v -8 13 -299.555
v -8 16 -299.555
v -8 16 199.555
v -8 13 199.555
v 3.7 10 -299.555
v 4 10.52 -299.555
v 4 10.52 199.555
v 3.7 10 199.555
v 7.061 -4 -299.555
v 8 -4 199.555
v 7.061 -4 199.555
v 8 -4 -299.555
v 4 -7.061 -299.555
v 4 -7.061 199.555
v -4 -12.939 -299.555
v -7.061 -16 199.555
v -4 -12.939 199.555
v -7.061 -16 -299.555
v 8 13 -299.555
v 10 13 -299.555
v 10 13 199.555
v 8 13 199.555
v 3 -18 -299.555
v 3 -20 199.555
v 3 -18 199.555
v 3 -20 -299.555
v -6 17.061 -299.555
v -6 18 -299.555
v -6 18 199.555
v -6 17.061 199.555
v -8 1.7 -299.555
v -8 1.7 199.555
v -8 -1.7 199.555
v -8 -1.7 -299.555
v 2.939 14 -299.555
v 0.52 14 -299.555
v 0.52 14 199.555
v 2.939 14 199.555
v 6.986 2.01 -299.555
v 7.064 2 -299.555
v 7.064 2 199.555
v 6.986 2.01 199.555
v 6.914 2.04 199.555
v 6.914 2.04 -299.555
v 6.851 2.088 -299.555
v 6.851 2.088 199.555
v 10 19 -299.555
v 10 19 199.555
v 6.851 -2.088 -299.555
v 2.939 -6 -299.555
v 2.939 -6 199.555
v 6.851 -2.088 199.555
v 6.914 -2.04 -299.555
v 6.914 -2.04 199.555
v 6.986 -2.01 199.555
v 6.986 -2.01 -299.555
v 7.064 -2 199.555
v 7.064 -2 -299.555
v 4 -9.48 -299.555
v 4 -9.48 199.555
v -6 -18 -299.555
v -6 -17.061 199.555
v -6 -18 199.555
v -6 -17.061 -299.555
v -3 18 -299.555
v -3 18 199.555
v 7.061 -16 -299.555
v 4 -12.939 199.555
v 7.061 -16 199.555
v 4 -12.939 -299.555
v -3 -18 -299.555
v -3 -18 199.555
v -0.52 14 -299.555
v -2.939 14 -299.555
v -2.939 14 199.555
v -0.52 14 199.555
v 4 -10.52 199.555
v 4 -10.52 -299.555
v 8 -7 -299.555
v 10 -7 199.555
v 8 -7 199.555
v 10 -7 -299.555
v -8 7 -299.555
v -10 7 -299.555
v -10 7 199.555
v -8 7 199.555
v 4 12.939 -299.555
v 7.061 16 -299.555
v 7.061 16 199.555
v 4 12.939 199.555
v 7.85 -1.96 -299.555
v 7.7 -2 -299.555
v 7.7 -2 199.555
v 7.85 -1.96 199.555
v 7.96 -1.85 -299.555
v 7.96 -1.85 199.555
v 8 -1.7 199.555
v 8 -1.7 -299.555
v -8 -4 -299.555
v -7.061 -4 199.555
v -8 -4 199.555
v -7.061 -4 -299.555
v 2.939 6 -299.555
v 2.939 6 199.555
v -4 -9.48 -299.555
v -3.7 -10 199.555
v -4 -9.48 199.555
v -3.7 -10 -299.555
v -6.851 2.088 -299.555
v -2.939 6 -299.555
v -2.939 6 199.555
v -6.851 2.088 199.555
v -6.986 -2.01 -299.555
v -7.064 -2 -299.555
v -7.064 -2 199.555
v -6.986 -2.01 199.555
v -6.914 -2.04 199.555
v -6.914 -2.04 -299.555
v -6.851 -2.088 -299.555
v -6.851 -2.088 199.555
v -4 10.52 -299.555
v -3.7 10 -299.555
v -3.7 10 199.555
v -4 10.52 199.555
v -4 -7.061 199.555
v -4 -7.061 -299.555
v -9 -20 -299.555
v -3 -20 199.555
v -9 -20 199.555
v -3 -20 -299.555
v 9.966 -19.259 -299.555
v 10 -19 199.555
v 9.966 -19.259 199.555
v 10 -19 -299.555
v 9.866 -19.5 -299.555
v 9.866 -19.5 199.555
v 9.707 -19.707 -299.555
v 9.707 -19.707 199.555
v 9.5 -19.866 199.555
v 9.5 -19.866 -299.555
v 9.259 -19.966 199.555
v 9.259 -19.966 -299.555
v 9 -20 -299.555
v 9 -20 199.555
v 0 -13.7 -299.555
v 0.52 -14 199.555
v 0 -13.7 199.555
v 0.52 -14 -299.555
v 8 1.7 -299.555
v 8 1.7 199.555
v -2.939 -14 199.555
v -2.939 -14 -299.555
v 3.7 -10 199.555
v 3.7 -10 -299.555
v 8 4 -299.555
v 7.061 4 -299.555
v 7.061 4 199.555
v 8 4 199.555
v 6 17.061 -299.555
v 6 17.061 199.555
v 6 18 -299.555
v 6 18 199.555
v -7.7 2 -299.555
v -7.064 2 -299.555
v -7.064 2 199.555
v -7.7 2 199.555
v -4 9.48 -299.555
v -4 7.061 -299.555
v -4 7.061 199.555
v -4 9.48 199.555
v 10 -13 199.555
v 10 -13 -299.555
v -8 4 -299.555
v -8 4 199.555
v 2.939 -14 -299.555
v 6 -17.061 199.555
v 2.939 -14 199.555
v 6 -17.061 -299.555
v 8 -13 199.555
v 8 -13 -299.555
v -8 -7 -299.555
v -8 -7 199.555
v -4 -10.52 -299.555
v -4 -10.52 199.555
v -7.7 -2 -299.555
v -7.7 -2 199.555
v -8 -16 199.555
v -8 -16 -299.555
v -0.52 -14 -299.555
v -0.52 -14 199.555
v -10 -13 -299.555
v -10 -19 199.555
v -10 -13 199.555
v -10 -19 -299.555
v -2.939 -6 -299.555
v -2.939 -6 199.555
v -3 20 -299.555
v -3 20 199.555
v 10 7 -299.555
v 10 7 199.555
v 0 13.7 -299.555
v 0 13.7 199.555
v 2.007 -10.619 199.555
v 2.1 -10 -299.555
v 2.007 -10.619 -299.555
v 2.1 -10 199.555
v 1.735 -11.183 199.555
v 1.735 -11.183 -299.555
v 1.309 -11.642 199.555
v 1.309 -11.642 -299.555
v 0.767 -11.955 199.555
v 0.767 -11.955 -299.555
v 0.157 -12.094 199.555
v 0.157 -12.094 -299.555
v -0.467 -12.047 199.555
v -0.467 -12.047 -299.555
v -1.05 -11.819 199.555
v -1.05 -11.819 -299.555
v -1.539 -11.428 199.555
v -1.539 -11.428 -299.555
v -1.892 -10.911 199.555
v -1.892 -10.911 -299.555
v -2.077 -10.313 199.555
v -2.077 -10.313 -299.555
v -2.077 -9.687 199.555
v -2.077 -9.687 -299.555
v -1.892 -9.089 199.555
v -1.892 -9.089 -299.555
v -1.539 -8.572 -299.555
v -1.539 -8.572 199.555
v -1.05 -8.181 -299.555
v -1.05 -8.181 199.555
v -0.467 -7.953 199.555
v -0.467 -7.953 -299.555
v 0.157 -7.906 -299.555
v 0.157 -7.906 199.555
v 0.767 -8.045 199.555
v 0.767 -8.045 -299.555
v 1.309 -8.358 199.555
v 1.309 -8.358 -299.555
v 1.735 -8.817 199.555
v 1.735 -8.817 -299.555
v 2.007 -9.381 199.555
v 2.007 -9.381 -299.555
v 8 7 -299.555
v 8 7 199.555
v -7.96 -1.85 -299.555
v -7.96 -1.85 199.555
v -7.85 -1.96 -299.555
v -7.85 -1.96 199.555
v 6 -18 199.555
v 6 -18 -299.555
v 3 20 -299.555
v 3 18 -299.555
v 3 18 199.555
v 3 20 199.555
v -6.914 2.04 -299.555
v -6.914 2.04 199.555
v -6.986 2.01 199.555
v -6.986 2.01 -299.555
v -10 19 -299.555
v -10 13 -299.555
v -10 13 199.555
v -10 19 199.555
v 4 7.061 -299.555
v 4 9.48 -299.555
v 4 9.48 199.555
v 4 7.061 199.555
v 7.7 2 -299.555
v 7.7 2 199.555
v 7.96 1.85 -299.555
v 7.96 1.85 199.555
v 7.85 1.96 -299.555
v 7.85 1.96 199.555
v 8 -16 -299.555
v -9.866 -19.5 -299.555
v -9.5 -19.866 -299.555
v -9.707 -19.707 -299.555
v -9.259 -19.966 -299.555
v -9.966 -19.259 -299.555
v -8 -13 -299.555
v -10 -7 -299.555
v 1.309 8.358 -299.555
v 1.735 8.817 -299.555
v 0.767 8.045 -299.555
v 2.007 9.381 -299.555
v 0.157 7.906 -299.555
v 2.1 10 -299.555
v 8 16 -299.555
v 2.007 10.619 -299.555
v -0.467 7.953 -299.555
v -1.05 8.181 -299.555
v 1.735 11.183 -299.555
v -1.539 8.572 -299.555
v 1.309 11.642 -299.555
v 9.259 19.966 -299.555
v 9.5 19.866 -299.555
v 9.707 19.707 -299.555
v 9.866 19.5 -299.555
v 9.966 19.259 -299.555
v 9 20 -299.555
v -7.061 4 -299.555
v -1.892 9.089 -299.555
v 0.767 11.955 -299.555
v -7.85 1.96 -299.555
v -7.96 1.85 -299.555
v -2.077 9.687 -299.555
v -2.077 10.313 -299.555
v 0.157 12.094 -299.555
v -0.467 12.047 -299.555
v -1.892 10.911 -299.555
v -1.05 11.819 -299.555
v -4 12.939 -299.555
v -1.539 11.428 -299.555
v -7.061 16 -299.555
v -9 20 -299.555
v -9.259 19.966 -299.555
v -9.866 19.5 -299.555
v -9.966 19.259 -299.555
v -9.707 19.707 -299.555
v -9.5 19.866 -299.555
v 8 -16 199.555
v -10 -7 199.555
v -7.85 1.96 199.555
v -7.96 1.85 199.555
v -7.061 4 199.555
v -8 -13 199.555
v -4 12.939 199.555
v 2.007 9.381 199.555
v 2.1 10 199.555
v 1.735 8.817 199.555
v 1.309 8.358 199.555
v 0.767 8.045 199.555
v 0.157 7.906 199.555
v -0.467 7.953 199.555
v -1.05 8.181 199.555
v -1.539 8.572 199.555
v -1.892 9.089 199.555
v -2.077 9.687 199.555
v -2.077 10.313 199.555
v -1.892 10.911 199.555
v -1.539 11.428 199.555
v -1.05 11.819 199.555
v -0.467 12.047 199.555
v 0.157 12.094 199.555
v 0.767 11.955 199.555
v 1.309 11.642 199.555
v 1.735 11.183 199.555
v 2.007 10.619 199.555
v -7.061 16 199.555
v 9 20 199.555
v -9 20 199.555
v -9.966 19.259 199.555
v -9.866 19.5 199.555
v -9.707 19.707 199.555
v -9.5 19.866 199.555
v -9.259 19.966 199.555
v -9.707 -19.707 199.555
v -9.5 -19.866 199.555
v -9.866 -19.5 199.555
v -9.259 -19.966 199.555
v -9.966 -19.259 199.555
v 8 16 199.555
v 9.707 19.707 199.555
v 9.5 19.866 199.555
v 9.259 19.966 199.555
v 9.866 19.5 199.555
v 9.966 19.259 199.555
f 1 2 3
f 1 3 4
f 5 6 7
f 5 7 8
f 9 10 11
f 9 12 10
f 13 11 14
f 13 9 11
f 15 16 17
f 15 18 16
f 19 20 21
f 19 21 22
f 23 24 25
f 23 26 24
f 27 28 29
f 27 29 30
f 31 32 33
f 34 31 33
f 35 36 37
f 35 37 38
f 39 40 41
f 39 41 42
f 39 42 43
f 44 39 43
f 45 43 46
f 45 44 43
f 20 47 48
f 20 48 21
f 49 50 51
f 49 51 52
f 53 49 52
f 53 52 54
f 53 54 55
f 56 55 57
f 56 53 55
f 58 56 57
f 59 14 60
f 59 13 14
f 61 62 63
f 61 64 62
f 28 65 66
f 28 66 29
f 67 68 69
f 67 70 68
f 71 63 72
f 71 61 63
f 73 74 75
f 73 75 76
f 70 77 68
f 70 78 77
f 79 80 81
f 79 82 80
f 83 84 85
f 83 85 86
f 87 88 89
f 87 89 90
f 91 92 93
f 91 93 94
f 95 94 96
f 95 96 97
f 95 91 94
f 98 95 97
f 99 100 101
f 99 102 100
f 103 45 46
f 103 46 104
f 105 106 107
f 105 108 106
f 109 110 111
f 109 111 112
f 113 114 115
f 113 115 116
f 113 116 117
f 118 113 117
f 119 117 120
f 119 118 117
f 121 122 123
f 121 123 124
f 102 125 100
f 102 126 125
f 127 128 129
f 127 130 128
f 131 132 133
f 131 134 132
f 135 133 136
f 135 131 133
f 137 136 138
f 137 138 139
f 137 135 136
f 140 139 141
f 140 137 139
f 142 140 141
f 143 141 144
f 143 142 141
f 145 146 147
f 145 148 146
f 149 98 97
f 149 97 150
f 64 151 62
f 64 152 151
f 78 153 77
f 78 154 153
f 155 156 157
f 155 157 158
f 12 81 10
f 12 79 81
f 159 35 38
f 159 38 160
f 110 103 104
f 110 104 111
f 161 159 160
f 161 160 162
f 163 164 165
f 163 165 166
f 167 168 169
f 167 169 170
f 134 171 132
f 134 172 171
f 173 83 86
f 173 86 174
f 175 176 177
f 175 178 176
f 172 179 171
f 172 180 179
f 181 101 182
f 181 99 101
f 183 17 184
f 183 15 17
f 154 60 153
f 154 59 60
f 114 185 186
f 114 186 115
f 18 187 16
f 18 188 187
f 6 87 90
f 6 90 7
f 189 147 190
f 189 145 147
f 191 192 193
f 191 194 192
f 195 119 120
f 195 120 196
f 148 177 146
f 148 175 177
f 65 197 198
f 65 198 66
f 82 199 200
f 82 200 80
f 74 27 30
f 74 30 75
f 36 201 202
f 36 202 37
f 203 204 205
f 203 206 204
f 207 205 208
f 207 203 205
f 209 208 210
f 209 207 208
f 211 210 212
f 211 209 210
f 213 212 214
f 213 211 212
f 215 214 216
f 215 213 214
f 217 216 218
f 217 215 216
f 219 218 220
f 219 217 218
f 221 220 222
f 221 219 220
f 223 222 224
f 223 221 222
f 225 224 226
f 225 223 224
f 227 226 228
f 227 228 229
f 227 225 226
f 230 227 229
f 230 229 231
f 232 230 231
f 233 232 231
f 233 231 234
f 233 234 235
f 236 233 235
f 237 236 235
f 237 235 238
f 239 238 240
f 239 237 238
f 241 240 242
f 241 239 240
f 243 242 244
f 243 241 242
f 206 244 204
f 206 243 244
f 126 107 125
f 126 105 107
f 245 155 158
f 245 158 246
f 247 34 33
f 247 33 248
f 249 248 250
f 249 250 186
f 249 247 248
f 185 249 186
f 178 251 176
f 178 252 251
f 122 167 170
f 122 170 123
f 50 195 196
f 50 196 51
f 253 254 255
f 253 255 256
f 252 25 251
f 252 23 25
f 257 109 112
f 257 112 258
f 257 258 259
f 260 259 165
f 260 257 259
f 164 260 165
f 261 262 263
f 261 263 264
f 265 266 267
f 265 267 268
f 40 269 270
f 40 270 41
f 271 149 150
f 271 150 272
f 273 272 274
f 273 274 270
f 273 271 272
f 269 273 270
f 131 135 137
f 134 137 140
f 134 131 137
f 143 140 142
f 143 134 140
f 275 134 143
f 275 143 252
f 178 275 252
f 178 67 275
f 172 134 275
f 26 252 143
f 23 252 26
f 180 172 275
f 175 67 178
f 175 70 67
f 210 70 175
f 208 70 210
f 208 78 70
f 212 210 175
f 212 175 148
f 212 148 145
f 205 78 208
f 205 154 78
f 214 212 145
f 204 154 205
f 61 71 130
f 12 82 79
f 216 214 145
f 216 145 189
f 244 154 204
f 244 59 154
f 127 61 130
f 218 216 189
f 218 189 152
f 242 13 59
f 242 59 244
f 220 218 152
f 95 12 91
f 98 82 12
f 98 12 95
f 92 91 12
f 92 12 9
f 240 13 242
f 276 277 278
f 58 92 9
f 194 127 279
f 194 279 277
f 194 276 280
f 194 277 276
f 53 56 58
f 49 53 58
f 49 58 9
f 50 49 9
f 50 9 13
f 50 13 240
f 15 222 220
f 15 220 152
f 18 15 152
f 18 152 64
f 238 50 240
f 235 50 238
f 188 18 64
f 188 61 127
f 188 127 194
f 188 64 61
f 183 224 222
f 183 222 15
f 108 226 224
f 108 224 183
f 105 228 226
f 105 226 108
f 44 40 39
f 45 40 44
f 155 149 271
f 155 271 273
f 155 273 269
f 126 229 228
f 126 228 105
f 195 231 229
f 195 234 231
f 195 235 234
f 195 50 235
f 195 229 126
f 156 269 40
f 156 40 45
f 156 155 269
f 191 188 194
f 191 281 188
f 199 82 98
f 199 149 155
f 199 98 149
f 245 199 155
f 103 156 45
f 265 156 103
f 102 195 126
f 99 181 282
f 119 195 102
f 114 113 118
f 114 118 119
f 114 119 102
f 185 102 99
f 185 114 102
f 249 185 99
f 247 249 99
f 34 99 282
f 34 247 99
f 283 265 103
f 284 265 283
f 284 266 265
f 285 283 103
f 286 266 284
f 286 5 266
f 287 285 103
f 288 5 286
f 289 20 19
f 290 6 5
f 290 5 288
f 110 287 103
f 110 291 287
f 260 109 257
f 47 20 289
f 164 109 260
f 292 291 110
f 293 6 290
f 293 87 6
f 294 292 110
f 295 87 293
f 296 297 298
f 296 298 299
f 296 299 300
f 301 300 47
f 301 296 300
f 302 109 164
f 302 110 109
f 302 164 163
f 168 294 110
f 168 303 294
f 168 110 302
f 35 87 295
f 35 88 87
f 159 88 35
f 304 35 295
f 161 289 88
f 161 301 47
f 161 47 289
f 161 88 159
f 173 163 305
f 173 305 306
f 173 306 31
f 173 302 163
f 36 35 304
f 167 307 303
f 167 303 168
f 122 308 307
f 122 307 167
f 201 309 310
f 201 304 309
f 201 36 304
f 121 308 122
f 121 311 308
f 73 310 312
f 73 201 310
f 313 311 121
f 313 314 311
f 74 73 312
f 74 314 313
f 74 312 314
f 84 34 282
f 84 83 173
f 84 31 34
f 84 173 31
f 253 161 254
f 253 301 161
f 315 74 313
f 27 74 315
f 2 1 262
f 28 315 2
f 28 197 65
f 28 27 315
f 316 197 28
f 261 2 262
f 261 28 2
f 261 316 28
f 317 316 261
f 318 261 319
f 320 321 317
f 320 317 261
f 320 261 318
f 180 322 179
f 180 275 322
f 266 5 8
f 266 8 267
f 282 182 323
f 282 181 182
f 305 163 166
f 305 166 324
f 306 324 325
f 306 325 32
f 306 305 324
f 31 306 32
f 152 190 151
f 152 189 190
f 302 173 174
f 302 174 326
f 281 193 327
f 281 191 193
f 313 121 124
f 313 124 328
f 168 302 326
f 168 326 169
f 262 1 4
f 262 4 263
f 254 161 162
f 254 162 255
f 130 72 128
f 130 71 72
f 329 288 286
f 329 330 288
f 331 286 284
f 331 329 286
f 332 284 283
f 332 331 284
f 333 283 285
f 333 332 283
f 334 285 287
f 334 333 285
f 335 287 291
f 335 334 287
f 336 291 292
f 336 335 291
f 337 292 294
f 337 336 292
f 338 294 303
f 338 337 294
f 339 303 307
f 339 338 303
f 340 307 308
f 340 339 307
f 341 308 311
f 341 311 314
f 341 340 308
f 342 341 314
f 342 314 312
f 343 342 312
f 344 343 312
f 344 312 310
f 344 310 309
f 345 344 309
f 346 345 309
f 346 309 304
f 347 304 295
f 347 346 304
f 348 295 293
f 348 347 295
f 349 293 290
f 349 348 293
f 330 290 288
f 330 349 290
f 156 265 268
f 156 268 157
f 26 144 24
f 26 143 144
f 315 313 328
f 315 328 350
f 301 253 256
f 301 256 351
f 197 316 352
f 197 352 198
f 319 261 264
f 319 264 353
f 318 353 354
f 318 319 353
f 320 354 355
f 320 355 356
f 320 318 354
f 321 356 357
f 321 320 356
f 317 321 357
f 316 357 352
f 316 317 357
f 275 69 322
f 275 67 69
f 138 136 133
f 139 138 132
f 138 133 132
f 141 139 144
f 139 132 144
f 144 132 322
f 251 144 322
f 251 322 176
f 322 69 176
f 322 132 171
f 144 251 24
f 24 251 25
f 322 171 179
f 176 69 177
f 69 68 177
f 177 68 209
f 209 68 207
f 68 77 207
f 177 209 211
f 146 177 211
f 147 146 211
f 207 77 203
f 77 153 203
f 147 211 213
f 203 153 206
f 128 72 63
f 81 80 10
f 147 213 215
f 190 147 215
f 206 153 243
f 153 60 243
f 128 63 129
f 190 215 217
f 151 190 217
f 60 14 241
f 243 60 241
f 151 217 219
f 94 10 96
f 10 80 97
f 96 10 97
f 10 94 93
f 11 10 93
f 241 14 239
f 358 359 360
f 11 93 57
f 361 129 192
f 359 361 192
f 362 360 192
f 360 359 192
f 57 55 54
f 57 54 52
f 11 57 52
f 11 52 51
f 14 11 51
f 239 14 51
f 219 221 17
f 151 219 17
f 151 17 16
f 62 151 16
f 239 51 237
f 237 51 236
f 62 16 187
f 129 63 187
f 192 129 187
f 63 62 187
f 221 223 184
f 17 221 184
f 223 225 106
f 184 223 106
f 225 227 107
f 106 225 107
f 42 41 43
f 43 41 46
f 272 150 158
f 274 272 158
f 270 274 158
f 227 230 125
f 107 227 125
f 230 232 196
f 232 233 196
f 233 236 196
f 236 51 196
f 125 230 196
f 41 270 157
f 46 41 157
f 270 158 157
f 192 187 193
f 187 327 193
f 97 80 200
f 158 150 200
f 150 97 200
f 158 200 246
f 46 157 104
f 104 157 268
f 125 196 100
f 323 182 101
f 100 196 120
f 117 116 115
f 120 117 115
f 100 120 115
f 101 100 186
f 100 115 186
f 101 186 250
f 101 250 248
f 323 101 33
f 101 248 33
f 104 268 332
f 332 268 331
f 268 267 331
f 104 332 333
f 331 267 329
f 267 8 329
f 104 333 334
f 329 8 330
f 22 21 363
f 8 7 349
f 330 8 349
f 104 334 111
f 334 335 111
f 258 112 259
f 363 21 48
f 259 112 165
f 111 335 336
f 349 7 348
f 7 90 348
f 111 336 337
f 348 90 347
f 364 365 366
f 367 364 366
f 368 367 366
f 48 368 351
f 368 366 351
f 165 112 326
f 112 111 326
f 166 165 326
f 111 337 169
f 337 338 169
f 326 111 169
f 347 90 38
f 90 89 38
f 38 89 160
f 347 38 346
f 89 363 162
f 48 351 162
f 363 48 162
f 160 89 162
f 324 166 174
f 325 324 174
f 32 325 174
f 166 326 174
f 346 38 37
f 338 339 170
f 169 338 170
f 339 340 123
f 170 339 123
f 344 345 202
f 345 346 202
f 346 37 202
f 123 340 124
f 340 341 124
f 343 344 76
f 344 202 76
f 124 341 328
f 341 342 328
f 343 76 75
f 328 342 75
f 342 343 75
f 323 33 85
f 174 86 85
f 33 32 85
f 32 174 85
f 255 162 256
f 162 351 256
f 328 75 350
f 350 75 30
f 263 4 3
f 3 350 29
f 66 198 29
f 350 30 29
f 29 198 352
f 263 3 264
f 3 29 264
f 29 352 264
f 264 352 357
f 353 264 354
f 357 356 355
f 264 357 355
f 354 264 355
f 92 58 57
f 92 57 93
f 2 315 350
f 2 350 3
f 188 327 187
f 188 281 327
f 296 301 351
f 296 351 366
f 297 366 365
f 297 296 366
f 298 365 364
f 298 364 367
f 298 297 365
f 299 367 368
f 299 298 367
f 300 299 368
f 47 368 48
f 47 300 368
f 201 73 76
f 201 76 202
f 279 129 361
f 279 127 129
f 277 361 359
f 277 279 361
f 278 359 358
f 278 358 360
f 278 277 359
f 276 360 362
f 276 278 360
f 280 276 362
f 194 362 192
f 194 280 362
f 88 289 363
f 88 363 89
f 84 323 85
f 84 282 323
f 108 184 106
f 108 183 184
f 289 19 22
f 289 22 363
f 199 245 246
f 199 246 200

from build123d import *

# Parameters (mm, degrees)
SKETCH1_R           = 2.1
BOSS_EXTRUDE1_DEPTH = 249.555


with BuildPart() as part:
    # Sketch1 → Boss-Extrude1 (new, symmetric)
    with BuildSketch(Plane(origin=(0, 0, -50), x_dir=(-1, 0, 0), z_dir=(0, 0, -1))):
        with BuildLine():
            Line((10, -7), (10, 7))
            Line((10, 7), (8, 7))
            Line((8, 7), (8, 4))
            Line((8, 4), (7.060660172, 4))
            Line((7.060660172, 4), (4, 7.060660172))
            Line((4, 7.060660172), (4, 9.480384758))
            Line((4, 9.480384758), (3.7, 10))
            Line((3.7, 10), (4, 10.519615242))
            Line((4, 10.519615242), (4, 12.939339828))
            Line((4, 12.939339828), (7.060660172, 16))
            Line((7.060660172, 16), (8, 16))
            Line((8, 16), (8, 13))
            Line((8, 13), (10, 13))
            Line((10, 13), (10, 19))
            ThreePointArc((10, 19), (9.707106781, 19.707106781), (9, 20))
            Line((9, 20), (3, 20))
            Line((3, 20), (3, 18))
            Line((3, 18), (6, 18))
            Line((6, 18), (6, 17.060660172))
            Line((6, 17.060660172), (2.939339828, 14))
            Line((2.939339828, 14), (0.519615242, 14))
            Line((0.519615242, 14), (0, 13.7))
            Line((0, 13.7), (-0.519615242, 14))
            Line((-0.519615242, 14), (-2.939339828, 14))
            Line((-2.939339828, 14), (-6, 17.060660172))
            Line((-6, 17.060660172), (-6, 18))
            Line((-6, 18), (-3, 18))
            Line((-3, 18), (-3, 20))
            Line((-3, 20), (-9, 20))
            ThreePointArc((-9, 20), (-9.707106781, 19.707106781), (-10, 19))
            Line((-10, 19), (-10, 13))
            Line((-10, 13), (-8, 13))
            Line((-8, 13), (-8, 16))
            Line((-8, 16), (-7.060660172, 16))
            Line((-7.060660172, 16), (-4, 12.939339828))
            Line((-4, 12.939339828), (-4, 10.519615242))
            Line((-4, 10.519615242), (-3.7, 10))
            Line((-3.7, 10), (-4, 9.480384758))
            Line((-4, 9.480384758), (-4, 7.060660172))
            Line((-4, 7.060660172), (-7.060660172, 4))
            Line((-7.060660172, 4), (-8, 4))
            Line((-8, 4), (-8, 7))
            Line((-8, 7), (-10, 7))
            Line((-10, 7), (-10, -7))
            Line((-10, -7), (-8, -7))
            Line((-8, -7), (-8, -4))
            Line((-8, -4), (-7.060660172, -4))
            Line((-7.060660172, -4), (-4, -7.060660172))
            Line((-4, -7.060660172), (-4, -9.480384758))
            Line((-4, -9.480384758), (-3.7, -10))
            Line((-3.7, -10), (-4, -10.519615242))
            Line((-4, -10.519615242), (-4, -12.939339828))
            Line((-4, -12.939339828), (-7.060660172, -16))
            Line((-7.060660172, -16), (-8, -16))
            Line((-8, -16), (-8, -13))
            Line((-8, -13), (-10, -13))
            Line((-10, -13), (-10, -19))
            ThreePointArc((-10, -19), (-9.707106781, -19.707106781), (-9, -20))
            Line((-9, -20), (-3, -20))
            Line((-3, -20), (-3, -18))
            Line((-3, -18), (-6, -18))
            Line((-6, -18), (-6, -17.060660172))
            Line((-6, -17.060660172), (-2.939339828, -14))
            Line((-2.939339828, -14), (-0.519615242, -14))
            Line((-0.519615242, -14), (0, -13.7))
            Line((0, -13.7), (0.519615242, -14))
            Line((0.519615242, -14), (2.939339828, -14))
            Line((2.939339828, -14), (6, -17.060660172))
            Line((6, -17.060660172), (6, -18))
            Line((6, -18), (3, -18))
            Line((3, -18), (3, -20))
            Line((3, -20), (9, -20))
            ThreePointArc((9, -20), (9.707106781, -19.707106781), (10, -19))
            Line((10, -19), (10, -13))
            Line((10, -13), (8, -13))
            Line((8, -13), (8, -16))
            Line((8, -16), (7.060660172, -16))
            Line((7.060660172, -16), (4, -12.939339828))
            Line((4, -12.939339828), (4, -10.519615242))
            Line((4, -10.519615242), (3.7, -10))
            Line((3.7, -10), (4, -9.480384758))
            Line((4, -9.480384758), (4, -7.060660172))
            Line((4, -7.060660172), (7.060660172, -4))
            Line((7.060660172, -4), (8, -4))
            Line((8, -4), (8, -7))
            Line((8, -7), (10, -7))
        make_face()
        with Locations(Location((0, -10, 0), (0, 0, 180))):
            Circle(SKETCH1_R, mode=Mode.SUBTRACT)
        with Locations(Location((0, 10, 0), (0, 0, 180))):
            Circle(SKETCH1_R, mode=Mode.SUBTRACT)
        with BuildLine():
            Line((8, 1.7), (8, -1.7))
            ThreePointArc((8, -1.7), (7.912132034, -1.912132034), (7.7, -2))
            Line((7.7, -2), (7.063603897, -2))
            ThreePointArc((7.063603897, -2), (6.948798867, -2.02283614), (6.851471863, -2.087867966))
            Line((6.851471863, -2.087867966), (2.939339828, -6))
            Line((2.939339828, -6), (-2.939339828, -6))
            Line((-2.939339828, -6), (-6.851471863, -2.087867966))
            ThreePointArc((-6.851471863, -2.087867966), (-6.948798867, -2.02283614), (-7.063603897, -2))
            Line((-7.063603897, -2), (-7.7, -2))
            ThreePointArc((-7.7, -2), (-7.912132034, -1.912132034), (-8, -1.7))
            Line((-8, -1.7), (-8, 1.7))
            ThreePointArc((-8, 1.7), (-7.912132034, 1.912132034), (-7.7, 2))
            Line((-7.7, 2), (-7.063603897, 2))
            ThreePointArc((-7.063603897, 2), (-6.948798867, 2.02283614), (-6.851471863, 2.087867966))
            Line((-6.851471863, 2.087867966), (-2.939339828, 6))
            Line((-2.939339828, 6), (2.939339828, 6))
            Line((2.939339828, 6), (6.851471863, 2.087867966))
            ThreePointArc((6.851471863, 2.087867966), (6.948798867, 2.02283614), (7.063603897, 2))
            Line((7.063603897, 2), (7.7, 2))
            ThreePointArc((7.7, 2), (7.912132034, 1.912132034), (8, 1.7))
        make_face(mode=Mode.SUBTRACT)
    extrude(amount=BOSS_EXTRUDE1_DEPTH, both=True)


solid = part.part
